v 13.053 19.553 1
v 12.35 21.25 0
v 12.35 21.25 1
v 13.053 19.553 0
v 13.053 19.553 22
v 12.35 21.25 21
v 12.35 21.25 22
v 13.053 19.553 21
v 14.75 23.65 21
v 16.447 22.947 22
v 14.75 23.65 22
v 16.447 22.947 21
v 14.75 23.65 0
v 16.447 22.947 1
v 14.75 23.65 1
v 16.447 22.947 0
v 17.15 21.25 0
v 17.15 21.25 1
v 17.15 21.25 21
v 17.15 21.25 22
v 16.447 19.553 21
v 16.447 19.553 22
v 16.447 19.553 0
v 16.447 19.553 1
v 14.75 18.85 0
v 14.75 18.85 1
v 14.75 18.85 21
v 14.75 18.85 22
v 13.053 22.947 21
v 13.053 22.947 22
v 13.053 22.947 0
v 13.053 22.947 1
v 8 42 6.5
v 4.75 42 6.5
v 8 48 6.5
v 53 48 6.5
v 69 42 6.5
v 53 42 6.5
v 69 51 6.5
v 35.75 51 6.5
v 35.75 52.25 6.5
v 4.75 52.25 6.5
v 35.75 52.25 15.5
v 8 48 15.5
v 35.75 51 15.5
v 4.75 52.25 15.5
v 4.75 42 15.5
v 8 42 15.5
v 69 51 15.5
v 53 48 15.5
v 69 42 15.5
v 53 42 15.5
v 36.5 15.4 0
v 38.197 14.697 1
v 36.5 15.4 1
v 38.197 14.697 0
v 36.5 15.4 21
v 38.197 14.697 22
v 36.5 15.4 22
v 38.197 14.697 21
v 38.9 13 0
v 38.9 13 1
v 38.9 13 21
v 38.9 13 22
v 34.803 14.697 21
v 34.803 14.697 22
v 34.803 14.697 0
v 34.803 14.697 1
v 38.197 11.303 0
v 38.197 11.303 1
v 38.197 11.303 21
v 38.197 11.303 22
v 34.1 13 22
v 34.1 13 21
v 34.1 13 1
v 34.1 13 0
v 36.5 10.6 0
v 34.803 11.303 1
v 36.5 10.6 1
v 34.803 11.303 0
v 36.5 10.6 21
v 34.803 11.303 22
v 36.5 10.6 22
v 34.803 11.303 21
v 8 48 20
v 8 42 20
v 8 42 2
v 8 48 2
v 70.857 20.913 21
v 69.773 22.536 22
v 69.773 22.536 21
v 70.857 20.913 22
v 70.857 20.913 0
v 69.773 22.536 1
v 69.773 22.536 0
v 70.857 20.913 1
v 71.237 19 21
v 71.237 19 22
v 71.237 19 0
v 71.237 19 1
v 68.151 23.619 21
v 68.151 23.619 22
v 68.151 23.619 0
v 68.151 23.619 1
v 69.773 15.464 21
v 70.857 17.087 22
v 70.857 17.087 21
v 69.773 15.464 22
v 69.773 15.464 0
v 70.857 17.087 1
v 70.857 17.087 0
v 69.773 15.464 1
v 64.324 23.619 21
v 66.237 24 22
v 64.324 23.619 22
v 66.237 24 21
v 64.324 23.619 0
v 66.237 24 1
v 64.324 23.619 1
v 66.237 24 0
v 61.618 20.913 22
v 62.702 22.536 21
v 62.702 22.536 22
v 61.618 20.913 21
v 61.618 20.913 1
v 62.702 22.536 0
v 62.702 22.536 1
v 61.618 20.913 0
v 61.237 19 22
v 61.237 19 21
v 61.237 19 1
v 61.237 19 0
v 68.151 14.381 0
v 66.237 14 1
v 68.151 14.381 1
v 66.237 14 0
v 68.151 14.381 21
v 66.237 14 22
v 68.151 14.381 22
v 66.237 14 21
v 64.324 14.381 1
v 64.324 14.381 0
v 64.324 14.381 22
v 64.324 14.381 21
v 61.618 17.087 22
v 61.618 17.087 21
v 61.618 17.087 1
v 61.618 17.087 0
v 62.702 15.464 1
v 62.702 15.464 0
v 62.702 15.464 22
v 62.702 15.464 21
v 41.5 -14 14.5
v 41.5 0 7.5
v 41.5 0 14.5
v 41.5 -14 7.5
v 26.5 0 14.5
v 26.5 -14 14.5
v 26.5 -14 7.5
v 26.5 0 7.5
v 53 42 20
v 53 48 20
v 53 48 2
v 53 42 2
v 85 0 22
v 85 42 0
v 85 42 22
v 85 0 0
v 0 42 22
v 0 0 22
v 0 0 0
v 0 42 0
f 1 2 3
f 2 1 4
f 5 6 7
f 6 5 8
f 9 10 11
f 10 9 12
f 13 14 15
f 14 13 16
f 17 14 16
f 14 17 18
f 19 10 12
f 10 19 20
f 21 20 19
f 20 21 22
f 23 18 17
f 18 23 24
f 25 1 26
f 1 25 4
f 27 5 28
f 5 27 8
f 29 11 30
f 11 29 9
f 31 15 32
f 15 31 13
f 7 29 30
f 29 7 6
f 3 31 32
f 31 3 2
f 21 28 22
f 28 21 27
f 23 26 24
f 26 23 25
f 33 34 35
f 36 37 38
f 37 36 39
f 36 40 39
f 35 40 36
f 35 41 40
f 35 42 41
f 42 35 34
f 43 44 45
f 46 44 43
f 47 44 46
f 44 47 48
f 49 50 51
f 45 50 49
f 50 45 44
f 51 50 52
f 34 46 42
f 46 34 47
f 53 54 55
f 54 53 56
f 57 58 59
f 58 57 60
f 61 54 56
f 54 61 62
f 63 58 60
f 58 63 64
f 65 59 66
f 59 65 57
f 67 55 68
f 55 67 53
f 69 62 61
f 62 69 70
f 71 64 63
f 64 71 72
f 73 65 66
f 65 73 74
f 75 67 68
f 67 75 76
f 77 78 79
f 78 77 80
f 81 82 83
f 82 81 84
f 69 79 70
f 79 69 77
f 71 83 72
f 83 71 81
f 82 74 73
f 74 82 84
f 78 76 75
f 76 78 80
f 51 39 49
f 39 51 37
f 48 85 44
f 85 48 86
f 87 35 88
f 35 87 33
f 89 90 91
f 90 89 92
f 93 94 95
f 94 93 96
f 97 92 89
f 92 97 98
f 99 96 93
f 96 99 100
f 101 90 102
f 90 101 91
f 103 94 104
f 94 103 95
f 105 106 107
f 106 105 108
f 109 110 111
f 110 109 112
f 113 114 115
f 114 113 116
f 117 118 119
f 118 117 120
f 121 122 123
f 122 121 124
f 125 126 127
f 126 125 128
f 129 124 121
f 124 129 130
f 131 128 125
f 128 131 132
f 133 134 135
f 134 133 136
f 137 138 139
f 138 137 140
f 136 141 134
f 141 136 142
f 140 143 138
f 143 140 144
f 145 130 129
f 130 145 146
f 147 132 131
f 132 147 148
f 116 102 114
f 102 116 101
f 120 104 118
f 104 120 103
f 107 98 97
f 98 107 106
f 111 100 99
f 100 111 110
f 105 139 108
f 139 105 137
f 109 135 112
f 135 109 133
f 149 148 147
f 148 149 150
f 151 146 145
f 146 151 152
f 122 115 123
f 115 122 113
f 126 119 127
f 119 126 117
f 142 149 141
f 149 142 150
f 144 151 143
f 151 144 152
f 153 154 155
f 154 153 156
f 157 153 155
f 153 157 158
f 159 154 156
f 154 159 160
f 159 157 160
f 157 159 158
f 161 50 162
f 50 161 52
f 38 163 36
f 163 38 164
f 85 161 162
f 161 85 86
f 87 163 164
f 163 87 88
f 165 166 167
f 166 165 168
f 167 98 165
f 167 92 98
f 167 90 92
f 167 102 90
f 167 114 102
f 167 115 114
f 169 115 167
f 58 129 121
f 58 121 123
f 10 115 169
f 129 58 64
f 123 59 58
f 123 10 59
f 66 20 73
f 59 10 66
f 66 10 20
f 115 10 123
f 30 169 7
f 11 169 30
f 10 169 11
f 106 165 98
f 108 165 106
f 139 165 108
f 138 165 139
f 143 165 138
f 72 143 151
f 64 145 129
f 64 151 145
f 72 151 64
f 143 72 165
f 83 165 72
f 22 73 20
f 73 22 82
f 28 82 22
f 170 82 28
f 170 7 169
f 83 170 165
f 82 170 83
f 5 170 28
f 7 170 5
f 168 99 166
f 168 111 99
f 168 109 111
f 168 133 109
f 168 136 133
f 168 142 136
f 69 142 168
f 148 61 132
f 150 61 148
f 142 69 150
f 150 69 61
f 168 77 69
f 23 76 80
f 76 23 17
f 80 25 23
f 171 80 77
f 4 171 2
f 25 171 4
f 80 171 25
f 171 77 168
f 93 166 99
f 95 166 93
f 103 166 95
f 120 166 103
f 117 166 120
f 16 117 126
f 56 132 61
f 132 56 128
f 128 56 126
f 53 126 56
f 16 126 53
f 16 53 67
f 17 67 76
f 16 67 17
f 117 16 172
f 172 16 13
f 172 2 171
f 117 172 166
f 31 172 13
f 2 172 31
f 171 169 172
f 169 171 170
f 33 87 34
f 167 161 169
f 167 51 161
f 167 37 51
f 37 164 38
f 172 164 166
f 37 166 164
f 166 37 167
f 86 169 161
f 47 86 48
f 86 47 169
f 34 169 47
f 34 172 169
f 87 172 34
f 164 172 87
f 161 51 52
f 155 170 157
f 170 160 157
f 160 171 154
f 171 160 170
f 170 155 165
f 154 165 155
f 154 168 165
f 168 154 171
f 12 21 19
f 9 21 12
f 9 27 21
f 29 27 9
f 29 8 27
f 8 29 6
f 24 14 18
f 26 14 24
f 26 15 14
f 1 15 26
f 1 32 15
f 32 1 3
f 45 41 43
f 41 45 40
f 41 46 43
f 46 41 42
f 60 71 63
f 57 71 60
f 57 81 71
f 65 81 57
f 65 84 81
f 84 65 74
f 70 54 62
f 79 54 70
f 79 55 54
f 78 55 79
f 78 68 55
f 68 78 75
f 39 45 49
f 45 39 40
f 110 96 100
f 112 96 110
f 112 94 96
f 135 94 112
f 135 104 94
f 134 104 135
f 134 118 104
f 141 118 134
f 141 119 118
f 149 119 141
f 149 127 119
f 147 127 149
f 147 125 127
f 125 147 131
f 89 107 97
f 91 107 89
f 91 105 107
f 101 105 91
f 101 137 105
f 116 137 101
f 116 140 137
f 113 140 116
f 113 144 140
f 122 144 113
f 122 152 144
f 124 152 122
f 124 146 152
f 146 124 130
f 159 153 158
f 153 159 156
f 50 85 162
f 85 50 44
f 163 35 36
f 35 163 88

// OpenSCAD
module triggerPack(pinWidth=20) {

pinRadius = 2.4; // 0.1560*25.4/2;
  
frontPinOffsetX = 6.75;
frontPinOffsetY = 16.25;

rearPinOffsetX = 28.5;
rearPinOffsetY = 8;

selectorRadius = 5; // Diameter: .3760" = 9.55mm
selectorOffsetX = frontPinOffsetX+(1.968*25.4) + 1.5;
selectorOffsetY = 14;

hammerLength = 41;
hammerWidth = 9;
hammerPivotRadius = 10;

triggerPackHeight = 43;
triggerPackWidth = 18;
triggerPackLength = 45;
triggerWidth = 7;
  
  // Trigger pack body
  cube([triggerPackLength,triggerPackHeight,triggerPackWidth]);
  
  translate([0,0,triggerPackWidth/2]) {
  
    // Pins and hammer path
    translate([frontPinOffsetX,frontPinOffsetY,0]) {
      
      // Hammer pin
      cylinder(r=pinRadius, h=pinWidth, center=true);
      
      // Hammer pivot
      cylinder(r=hammerPivotRadius, h=hammerWidth, center=true);
      
      // Hammer travel
      translate([-hammerPivotRadius,0,-hammerWidth/2])
      cube([hammerLength-hammerPivotRadius,hammerLength-hammerPivotRadius,hammerWidth]);
    };
    
    // Rear pin
    translate([rearPinOffsetX,rearPinOffsetY,0])
    cylinder(r=pinRadius, h=pinWidth, center=true);
    
    // Sear Extension
    translate([0,3,0-hammerWidth/2])
    cube([triggerPackLength+16,triggerPackHeight,hammerWidth]);
    
    // Selector
    translate([selectorOffsetX,selectorOffsetY,0])
    cylinder(r=selectorRadius, h=pinWidth, center=true);
    
    // Trigger
    translate([rearPinOffsetX - 10,-19,-3.5])
    cube([15,20,7]);
  }
}


module triggerHousing(wall=2) {
  tubingOuter=26;
  difference() {
    cube([85,42,18 + (wall*2)]);
    
    translate([8,5,wall])
    triggerPack(pinWidth=tubingOuter+10);
  }
}

render()
//rotate([90,0,0])
triggerHousing();

translate([8,5,2])
#triggerPack();
